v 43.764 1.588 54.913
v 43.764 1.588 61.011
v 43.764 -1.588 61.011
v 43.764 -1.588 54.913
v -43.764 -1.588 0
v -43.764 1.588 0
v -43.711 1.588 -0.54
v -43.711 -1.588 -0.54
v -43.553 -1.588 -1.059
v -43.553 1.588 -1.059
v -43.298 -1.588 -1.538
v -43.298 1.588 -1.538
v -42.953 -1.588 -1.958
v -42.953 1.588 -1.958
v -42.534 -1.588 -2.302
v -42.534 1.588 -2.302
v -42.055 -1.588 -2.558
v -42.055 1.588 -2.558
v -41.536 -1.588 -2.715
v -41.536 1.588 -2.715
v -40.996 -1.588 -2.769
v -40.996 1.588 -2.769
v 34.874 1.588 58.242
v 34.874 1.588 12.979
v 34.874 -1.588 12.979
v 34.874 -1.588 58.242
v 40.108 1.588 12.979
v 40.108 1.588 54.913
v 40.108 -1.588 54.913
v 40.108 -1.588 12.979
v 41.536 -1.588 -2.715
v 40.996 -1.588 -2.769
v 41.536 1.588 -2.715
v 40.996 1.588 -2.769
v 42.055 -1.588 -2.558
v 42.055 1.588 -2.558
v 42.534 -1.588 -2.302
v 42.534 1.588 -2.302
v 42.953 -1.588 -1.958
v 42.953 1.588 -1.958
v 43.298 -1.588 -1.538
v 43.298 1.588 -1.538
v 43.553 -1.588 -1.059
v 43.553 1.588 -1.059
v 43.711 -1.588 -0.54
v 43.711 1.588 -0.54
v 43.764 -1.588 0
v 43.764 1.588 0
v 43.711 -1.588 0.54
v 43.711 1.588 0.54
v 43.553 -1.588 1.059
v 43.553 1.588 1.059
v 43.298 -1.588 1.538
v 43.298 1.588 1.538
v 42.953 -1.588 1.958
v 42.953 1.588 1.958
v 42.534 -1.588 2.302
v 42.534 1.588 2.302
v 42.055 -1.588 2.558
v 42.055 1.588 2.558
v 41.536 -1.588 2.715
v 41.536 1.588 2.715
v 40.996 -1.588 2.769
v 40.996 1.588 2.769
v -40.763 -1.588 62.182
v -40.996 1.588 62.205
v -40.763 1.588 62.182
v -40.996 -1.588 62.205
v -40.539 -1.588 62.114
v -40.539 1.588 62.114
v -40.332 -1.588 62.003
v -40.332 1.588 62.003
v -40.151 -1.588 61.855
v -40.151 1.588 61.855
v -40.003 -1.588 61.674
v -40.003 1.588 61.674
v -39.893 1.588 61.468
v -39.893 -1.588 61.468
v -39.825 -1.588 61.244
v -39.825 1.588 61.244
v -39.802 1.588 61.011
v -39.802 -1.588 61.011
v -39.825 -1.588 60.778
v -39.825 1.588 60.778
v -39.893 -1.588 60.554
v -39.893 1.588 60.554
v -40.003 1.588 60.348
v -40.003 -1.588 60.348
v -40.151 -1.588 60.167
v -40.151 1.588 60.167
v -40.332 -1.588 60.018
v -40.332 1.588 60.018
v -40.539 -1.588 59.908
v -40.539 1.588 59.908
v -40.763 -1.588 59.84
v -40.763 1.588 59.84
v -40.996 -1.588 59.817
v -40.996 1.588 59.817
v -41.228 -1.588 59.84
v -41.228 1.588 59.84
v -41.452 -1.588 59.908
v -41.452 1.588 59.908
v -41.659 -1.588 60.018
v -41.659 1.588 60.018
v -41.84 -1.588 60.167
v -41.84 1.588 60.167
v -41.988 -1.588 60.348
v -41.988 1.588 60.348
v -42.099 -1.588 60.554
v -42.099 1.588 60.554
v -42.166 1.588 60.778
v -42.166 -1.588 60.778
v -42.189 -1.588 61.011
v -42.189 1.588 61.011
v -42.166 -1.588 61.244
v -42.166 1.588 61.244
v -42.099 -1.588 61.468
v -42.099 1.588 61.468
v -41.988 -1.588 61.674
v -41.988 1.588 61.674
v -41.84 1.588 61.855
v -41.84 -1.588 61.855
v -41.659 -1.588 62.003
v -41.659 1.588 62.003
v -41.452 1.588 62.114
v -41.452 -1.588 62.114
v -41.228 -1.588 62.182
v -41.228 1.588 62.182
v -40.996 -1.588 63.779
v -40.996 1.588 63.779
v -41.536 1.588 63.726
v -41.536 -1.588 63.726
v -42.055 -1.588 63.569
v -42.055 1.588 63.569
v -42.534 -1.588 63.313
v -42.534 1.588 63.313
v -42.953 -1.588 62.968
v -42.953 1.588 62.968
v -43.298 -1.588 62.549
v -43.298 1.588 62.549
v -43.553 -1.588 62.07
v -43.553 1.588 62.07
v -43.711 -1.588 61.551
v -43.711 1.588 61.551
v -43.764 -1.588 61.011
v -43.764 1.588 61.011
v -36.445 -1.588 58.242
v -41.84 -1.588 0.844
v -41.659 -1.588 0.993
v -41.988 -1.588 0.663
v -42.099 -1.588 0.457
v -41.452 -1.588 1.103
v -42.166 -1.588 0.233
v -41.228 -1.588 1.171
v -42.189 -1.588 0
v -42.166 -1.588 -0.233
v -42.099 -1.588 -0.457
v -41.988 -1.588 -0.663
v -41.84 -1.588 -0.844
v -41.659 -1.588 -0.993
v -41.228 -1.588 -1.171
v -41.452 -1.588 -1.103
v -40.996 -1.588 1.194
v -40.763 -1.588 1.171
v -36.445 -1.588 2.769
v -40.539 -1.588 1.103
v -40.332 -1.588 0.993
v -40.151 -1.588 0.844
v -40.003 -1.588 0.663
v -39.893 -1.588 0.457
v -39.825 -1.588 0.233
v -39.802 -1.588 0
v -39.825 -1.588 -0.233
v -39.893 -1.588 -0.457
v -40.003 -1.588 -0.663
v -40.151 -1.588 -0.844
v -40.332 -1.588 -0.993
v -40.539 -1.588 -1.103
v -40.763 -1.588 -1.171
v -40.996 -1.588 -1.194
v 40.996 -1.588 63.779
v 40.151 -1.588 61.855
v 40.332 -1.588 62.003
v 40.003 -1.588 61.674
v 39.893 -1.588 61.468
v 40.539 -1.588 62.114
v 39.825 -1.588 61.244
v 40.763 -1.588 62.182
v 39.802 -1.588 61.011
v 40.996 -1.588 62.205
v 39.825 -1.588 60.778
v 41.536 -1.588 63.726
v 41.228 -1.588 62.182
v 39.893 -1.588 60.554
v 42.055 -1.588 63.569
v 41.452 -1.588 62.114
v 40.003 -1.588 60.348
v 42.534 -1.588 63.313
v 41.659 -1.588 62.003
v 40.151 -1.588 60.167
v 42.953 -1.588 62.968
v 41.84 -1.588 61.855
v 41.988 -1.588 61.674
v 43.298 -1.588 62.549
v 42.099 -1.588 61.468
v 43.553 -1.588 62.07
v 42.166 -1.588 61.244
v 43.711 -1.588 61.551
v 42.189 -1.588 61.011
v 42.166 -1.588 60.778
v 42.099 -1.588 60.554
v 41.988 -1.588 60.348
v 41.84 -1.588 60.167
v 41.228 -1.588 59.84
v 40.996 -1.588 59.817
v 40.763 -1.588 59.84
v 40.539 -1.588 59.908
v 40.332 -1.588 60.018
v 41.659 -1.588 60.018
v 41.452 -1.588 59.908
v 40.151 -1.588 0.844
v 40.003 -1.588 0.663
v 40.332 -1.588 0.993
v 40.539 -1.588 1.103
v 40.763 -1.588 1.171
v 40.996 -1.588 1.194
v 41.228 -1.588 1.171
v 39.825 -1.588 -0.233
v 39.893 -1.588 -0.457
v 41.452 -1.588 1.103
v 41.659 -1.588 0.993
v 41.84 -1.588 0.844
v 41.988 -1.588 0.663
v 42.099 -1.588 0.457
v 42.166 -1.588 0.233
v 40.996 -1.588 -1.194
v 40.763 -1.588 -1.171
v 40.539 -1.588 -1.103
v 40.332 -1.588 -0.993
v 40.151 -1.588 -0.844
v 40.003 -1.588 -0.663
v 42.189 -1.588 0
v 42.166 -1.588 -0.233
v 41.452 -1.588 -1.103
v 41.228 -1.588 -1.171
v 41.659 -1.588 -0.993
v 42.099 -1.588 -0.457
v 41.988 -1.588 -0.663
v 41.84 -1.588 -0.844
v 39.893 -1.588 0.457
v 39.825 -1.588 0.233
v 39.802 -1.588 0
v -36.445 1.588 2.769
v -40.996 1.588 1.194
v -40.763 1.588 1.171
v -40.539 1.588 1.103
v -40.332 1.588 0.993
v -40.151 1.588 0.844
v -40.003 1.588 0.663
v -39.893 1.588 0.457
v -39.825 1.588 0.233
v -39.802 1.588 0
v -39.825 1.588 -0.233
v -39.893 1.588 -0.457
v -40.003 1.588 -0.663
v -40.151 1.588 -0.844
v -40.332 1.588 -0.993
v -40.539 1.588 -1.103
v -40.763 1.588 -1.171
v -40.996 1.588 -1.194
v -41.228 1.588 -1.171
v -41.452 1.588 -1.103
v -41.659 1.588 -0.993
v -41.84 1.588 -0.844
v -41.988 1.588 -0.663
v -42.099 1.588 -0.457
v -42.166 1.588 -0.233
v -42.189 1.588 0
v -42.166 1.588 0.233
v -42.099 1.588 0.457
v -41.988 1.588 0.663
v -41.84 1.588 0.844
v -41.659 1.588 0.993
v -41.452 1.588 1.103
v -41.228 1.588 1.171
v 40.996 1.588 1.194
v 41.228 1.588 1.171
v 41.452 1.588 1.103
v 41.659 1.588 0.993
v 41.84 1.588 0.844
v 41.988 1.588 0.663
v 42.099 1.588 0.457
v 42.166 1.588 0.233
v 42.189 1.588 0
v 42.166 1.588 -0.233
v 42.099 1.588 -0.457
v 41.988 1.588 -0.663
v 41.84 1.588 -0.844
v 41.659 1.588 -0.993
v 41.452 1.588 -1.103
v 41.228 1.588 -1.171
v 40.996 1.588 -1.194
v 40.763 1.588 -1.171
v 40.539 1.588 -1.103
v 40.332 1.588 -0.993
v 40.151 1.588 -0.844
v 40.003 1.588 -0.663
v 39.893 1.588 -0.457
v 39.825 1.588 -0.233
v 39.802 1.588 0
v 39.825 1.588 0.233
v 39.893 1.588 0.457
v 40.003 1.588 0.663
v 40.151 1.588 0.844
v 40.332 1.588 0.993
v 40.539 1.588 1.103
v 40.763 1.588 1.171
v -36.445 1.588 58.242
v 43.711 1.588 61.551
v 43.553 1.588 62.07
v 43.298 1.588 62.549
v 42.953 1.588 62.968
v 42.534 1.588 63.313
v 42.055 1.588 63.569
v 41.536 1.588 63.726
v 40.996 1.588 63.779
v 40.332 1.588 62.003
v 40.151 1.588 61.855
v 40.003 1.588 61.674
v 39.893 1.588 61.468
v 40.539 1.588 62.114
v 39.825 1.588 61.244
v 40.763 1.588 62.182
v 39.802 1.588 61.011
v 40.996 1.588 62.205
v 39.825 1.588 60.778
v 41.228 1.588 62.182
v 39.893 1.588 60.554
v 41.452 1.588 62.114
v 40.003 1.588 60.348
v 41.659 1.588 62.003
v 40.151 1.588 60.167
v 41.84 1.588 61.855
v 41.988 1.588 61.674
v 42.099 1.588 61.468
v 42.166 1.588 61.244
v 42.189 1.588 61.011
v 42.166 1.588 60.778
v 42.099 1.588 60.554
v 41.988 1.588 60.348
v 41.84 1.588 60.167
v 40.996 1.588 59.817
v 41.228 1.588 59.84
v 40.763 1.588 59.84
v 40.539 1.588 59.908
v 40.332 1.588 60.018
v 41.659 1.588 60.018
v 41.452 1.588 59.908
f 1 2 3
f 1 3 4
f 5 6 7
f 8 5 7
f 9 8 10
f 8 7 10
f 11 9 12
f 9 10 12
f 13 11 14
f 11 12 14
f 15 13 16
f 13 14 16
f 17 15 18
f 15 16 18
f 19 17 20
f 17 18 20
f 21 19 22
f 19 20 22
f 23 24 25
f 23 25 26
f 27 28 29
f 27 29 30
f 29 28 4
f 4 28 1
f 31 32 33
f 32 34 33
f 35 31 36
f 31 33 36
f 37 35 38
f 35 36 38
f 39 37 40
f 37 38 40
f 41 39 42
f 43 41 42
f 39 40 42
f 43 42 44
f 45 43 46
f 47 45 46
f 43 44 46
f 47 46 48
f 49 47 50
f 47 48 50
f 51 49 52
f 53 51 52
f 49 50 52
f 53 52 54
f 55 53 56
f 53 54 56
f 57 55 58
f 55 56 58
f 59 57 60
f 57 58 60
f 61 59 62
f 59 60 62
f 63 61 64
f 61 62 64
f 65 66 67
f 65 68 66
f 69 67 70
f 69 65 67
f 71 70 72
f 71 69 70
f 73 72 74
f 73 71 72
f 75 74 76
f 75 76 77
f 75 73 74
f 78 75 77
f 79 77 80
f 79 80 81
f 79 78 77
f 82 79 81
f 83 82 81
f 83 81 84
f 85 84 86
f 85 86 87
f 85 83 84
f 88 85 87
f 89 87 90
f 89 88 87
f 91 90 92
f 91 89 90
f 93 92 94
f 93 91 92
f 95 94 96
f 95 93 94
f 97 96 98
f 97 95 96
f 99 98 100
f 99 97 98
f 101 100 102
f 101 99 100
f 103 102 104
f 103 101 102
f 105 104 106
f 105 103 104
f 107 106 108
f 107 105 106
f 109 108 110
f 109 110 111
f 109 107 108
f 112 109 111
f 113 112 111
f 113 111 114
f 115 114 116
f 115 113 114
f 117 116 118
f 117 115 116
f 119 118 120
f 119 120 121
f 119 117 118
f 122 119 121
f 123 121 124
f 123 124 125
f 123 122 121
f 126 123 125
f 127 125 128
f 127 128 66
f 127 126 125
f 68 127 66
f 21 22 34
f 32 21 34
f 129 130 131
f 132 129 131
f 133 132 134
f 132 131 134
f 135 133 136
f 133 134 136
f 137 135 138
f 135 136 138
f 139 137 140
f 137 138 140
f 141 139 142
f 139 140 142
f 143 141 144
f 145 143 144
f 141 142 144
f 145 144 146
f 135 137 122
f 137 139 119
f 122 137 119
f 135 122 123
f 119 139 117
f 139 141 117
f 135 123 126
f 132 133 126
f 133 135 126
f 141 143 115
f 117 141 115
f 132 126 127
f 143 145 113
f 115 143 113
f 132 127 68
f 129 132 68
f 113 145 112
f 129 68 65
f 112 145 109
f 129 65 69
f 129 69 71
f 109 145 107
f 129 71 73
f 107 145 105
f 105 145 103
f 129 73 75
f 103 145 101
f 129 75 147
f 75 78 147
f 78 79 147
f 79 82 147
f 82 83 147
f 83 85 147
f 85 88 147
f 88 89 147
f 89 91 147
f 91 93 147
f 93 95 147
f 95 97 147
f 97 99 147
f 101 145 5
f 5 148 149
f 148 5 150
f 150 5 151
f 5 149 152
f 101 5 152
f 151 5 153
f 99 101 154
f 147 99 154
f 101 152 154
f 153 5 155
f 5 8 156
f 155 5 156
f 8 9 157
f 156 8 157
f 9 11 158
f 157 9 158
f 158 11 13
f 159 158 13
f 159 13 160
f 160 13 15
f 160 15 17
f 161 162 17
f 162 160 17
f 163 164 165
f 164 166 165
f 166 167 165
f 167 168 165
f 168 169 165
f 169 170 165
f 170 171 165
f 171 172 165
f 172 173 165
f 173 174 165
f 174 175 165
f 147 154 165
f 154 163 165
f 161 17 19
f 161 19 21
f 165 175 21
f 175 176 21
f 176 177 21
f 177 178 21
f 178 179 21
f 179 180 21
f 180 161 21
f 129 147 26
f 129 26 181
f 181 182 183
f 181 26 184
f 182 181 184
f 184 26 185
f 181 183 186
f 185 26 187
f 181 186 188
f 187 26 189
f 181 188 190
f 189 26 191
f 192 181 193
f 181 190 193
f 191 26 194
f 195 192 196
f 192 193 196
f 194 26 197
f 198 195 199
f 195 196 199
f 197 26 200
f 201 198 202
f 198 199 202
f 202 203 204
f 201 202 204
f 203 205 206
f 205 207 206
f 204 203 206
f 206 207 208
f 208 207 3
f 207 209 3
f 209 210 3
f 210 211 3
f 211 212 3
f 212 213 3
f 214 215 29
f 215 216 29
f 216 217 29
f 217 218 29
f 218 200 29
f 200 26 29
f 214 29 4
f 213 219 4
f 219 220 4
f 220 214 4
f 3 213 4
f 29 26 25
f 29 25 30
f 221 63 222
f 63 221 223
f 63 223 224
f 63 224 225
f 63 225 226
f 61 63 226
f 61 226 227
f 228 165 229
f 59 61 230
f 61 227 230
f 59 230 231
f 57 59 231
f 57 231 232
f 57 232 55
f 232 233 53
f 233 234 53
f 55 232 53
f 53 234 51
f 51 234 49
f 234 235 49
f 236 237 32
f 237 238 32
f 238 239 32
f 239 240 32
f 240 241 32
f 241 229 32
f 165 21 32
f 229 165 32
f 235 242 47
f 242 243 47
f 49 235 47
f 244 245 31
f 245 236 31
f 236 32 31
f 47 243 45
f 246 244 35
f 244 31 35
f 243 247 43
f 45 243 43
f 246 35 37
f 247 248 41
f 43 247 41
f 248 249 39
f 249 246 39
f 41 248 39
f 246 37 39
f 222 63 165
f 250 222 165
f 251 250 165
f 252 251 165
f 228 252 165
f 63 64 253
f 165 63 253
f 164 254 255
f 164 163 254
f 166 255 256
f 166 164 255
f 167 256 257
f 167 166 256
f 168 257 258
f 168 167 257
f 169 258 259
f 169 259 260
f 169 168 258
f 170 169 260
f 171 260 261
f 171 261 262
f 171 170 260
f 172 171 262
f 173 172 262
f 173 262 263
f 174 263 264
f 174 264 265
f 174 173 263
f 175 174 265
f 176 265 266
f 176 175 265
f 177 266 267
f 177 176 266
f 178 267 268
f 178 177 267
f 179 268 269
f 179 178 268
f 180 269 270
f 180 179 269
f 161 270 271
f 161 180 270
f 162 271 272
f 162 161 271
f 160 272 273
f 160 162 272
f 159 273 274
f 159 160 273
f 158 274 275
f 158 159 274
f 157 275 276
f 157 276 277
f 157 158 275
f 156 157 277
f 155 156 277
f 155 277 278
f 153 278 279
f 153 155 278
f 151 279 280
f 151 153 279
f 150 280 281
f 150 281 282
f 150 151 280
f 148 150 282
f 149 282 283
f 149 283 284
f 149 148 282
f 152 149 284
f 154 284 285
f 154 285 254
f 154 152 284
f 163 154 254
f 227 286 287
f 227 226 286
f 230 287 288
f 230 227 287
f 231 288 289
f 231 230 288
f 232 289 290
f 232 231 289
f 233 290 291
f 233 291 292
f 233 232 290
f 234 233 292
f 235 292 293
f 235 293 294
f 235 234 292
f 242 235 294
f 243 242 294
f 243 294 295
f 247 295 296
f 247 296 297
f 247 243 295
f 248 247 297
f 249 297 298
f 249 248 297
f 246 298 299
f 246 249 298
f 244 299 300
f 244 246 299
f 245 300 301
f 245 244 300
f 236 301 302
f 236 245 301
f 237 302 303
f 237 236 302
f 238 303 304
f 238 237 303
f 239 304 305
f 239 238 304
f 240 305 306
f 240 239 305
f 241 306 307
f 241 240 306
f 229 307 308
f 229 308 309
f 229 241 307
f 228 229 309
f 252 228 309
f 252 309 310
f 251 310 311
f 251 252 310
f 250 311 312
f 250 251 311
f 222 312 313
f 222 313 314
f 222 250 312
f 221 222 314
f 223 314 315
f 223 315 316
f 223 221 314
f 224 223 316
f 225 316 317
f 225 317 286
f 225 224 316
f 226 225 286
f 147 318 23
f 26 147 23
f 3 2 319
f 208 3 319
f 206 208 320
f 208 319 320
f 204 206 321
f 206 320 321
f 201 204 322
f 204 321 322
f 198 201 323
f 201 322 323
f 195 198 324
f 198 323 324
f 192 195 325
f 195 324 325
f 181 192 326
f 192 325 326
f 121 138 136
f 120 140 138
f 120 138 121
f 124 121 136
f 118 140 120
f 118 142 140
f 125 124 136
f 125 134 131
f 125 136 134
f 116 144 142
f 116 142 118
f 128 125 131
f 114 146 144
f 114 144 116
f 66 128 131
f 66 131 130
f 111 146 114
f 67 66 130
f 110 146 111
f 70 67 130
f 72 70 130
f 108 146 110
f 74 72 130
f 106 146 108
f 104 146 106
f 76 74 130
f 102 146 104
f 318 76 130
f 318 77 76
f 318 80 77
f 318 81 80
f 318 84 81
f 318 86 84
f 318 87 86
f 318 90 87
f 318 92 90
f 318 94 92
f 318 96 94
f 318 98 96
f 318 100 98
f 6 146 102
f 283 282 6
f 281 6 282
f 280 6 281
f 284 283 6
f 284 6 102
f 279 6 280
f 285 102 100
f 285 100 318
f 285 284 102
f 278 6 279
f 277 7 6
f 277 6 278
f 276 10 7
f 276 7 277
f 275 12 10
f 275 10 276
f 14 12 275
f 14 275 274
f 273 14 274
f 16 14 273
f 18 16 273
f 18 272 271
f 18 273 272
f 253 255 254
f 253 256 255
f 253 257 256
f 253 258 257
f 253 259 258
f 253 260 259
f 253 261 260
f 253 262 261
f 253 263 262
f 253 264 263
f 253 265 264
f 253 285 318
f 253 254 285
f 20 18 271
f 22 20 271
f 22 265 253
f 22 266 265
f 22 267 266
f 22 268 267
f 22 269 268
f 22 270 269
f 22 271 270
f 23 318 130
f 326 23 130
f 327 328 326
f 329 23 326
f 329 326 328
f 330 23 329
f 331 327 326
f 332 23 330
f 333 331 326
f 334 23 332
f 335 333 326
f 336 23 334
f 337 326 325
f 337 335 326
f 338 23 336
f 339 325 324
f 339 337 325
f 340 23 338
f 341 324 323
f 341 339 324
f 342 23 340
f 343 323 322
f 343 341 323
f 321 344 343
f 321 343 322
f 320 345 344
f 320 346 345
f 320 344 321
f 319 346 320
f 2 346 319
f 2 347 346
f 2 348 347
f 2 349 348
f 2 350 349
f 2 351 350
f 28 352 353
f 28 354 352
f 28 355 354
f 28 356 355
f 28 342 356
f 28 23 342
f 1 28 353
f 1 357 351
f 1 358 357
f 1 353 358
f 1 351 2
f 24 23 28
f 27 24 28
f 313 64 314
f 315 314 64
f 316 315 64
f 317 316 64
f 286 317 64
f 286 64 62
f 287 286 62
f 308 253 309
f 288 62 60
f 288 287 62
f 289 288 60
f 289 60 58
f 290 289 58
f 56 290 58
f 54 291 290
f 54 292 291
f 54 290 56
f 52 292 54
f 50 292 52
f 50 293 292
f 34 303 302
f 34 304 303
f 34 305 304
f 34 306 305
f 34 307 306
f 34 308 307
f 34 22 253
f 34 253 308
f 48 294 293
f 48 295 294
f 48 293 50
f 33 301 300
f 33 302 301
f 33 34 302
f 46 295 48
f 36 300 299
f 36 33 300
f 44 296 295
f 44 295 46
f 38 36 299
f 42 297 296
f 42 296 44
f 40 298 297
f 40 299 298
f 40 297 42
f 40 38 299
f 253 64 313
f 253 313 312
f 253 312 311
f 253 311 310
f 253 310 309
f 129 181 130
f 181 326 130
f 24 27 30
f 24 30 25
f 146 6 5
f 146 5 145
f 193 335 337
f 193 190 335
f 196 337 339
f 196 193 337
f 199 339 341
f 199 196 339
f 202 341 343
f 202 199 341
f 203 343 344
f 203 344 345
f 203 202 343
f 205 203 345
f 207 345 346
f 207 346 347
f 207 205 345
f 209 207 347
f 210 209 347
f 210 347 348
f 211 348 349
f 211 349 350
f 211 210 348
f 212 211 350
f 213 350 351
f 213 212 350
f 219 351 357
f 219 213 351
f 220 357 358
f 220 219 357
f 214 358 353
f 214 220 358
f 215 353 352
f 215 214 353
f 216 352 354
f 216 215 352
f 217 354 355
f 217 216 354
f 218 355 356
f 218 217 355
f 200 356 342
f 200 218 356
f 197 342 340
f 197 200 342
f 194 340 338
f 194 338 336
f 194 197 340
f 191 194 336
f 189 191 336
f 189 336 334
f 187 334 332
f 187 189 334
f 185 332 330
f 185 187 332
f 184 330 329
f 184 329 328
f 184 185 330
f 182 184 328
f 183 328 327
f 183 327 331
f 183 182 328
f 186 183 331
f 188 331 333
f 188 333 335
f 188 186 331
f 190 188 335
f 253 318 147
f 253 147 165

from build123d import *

# Parameters (mm, degrees)
SKETCH1_R           = 1.1938
BOSS_EXTRUDE1_DEPTH = 1.5875
SKETCH2_R           = 1.1938
BOSS_EXTRUDE2_DEPTH = 1.5875
BOSS_EXTRUDE3_DEPTH = 3.175
BOSS_EXTRUDE4_DEPTH = 3.175
SKETCH5_W           = 3.656154394
SKETCH5_H           = 41.933387184
CUT_EXTRUDE1_DEPTH  = 78.415745756


with BuildPart() as part:
    # Sketch1 → Boss-Extrude1 (new, symmetric)
    with BuildSketch(Plane(origin=(0, 0, 0), x_dir=(1, 0, 0), z_dir=(0, 1, 0))):
        with BuildLine():
            Line((-40.9956, 2.7686), (40.9956, 2.7686))
            ThreePointArc((40.9956, 2.7686), (43.7642, 0), (40.9956, -2.7686))
            Line((40.9956, -2.7686), (-40.9956, -2.7686))
            ThreePointArc((-40.9956, -2.7686), (-43.7642, 0), (-40.9956, 2.7686))
        make_face()
        with Locations(Location((-40.9956, 0, 0), (0, 0, 270))):
            Circle(SKETCH1_R, mode=Mode.SUBTRACT)
        with Locations(Location((40.9956, 0, 0), (0, 0, 270))):
            Circle(SKETCH1_R, mode=Mode.SUBTRACT)
    extrude(amount=BOSS_EXTRUDE1_DEPTH, both=True)



with BuildPart() as body_2:
    # Sketch2 → Boss-Extrude2 (new, symmetric)
    with BuildSketch(Plane(origin=(0, 0, 0), x_dir=(1, 0, 0), z_dir=(0, 1, 0))):
        with BuildLine():
            Line((-40.9956, -58.2422), (40.9956, -58.2422))
            ThreePointArc((40.9956, -58.2422), (43.7642, -61.0108), (40.9956, -63.7794))
            Line((40.9956, -63.7794), (-40.9956, -63.7794))
            ThreePointArc((-40.9956, -63.7794), (-43.7642, -61.0108), (-40.9956, -58.2422))
        make_face()
        with Locations(Location((-40.9956, -61.0108, 0), (0, 0, 270))):
            Circle(SKETCH2_R, mode=Mode.SUBTRACT)
        with Locations(Location((40.9956, -61.0108, 0), (0, 0, 270))):
            Circle(SKETCH2_R, mode=Mode.SUBTRACT)
    extrude(amount=BOSS_EXTRUDE2_DEPTH, both=True)


with BuildPart() as part_1:
    add(part.part)

    add(body_2.part)  # Boss-Extrude3 merges body 2
    # Sketch3 → Boss-Extrude3 (add)
    with BuildSketch(Plane(origin=(0, 1.5875, 0), x_dir=(1, 0, 0), z_dir=(0, 1, 0))):
        with BuildLine():
            ThreePointArc((-40.9956, -2.7686), (-42.953295834, -1.957695834), (-43.7642, 0))
            Line((-43.7642, 0), (-43.7642, -61.0108))
            ThreePointArc((-43.7642, -61.0108), (-42.953295834, -59.053104166), (-40.9956, -58.2422))
            Line((-40.9956, -58.2422), (-36.444722592, -58.2422))
            Line((-36.444722592, -58.2422), (-36.444722592, -2.7686))
            Line((-36.444722592, -2.7686), (-40.9956, -2.7686))
        make_face()
    extrude(amount=-BOSS_EXTRUDE3_DEPTH)

    # Sketch4 → Boss-Extrude4 (add)
    with BuildSketch(Plane(origin=(0, 1.5875, 0), x_dir=(1, 0, 0), z_dir=(0, 1, 0))):
        with BuildLine():
            ThreePointArc((40.9956, -58.2422), (42.953295834, -59.053104166), (43.7642, -61.0108))
            Line((43.7642, -61.0108), (43.7642, -12.9794))
            Line((43.7642, -12.9794), (34.8742, -12.9794))
            Line((34.8742, -12.9794), (34.8742, -58.2422))
            Line((34.8742, -58.2422), (40.9956, -58.2422))
        make_face()
    extrude(amount=-BOSS_EXTRUDE4_DEPTH)

    # Sketch5 → Cut-Extrude1 (cut, through all)
    with BuildSketch(Plane(origin=(0, 1.5875, 0), x_dir=(1, 0, 0), z_dir=(0, 1, 0))):
        with Locations((41.936122803, -33.946093592)):
            Rectangle(SKETCH5_W, SKETCH5_H)
    extrude(amount=-CUT_EXTRUDE1_DEPTH, mode=Mode.SUBTRACT)


solid = part_1.part
